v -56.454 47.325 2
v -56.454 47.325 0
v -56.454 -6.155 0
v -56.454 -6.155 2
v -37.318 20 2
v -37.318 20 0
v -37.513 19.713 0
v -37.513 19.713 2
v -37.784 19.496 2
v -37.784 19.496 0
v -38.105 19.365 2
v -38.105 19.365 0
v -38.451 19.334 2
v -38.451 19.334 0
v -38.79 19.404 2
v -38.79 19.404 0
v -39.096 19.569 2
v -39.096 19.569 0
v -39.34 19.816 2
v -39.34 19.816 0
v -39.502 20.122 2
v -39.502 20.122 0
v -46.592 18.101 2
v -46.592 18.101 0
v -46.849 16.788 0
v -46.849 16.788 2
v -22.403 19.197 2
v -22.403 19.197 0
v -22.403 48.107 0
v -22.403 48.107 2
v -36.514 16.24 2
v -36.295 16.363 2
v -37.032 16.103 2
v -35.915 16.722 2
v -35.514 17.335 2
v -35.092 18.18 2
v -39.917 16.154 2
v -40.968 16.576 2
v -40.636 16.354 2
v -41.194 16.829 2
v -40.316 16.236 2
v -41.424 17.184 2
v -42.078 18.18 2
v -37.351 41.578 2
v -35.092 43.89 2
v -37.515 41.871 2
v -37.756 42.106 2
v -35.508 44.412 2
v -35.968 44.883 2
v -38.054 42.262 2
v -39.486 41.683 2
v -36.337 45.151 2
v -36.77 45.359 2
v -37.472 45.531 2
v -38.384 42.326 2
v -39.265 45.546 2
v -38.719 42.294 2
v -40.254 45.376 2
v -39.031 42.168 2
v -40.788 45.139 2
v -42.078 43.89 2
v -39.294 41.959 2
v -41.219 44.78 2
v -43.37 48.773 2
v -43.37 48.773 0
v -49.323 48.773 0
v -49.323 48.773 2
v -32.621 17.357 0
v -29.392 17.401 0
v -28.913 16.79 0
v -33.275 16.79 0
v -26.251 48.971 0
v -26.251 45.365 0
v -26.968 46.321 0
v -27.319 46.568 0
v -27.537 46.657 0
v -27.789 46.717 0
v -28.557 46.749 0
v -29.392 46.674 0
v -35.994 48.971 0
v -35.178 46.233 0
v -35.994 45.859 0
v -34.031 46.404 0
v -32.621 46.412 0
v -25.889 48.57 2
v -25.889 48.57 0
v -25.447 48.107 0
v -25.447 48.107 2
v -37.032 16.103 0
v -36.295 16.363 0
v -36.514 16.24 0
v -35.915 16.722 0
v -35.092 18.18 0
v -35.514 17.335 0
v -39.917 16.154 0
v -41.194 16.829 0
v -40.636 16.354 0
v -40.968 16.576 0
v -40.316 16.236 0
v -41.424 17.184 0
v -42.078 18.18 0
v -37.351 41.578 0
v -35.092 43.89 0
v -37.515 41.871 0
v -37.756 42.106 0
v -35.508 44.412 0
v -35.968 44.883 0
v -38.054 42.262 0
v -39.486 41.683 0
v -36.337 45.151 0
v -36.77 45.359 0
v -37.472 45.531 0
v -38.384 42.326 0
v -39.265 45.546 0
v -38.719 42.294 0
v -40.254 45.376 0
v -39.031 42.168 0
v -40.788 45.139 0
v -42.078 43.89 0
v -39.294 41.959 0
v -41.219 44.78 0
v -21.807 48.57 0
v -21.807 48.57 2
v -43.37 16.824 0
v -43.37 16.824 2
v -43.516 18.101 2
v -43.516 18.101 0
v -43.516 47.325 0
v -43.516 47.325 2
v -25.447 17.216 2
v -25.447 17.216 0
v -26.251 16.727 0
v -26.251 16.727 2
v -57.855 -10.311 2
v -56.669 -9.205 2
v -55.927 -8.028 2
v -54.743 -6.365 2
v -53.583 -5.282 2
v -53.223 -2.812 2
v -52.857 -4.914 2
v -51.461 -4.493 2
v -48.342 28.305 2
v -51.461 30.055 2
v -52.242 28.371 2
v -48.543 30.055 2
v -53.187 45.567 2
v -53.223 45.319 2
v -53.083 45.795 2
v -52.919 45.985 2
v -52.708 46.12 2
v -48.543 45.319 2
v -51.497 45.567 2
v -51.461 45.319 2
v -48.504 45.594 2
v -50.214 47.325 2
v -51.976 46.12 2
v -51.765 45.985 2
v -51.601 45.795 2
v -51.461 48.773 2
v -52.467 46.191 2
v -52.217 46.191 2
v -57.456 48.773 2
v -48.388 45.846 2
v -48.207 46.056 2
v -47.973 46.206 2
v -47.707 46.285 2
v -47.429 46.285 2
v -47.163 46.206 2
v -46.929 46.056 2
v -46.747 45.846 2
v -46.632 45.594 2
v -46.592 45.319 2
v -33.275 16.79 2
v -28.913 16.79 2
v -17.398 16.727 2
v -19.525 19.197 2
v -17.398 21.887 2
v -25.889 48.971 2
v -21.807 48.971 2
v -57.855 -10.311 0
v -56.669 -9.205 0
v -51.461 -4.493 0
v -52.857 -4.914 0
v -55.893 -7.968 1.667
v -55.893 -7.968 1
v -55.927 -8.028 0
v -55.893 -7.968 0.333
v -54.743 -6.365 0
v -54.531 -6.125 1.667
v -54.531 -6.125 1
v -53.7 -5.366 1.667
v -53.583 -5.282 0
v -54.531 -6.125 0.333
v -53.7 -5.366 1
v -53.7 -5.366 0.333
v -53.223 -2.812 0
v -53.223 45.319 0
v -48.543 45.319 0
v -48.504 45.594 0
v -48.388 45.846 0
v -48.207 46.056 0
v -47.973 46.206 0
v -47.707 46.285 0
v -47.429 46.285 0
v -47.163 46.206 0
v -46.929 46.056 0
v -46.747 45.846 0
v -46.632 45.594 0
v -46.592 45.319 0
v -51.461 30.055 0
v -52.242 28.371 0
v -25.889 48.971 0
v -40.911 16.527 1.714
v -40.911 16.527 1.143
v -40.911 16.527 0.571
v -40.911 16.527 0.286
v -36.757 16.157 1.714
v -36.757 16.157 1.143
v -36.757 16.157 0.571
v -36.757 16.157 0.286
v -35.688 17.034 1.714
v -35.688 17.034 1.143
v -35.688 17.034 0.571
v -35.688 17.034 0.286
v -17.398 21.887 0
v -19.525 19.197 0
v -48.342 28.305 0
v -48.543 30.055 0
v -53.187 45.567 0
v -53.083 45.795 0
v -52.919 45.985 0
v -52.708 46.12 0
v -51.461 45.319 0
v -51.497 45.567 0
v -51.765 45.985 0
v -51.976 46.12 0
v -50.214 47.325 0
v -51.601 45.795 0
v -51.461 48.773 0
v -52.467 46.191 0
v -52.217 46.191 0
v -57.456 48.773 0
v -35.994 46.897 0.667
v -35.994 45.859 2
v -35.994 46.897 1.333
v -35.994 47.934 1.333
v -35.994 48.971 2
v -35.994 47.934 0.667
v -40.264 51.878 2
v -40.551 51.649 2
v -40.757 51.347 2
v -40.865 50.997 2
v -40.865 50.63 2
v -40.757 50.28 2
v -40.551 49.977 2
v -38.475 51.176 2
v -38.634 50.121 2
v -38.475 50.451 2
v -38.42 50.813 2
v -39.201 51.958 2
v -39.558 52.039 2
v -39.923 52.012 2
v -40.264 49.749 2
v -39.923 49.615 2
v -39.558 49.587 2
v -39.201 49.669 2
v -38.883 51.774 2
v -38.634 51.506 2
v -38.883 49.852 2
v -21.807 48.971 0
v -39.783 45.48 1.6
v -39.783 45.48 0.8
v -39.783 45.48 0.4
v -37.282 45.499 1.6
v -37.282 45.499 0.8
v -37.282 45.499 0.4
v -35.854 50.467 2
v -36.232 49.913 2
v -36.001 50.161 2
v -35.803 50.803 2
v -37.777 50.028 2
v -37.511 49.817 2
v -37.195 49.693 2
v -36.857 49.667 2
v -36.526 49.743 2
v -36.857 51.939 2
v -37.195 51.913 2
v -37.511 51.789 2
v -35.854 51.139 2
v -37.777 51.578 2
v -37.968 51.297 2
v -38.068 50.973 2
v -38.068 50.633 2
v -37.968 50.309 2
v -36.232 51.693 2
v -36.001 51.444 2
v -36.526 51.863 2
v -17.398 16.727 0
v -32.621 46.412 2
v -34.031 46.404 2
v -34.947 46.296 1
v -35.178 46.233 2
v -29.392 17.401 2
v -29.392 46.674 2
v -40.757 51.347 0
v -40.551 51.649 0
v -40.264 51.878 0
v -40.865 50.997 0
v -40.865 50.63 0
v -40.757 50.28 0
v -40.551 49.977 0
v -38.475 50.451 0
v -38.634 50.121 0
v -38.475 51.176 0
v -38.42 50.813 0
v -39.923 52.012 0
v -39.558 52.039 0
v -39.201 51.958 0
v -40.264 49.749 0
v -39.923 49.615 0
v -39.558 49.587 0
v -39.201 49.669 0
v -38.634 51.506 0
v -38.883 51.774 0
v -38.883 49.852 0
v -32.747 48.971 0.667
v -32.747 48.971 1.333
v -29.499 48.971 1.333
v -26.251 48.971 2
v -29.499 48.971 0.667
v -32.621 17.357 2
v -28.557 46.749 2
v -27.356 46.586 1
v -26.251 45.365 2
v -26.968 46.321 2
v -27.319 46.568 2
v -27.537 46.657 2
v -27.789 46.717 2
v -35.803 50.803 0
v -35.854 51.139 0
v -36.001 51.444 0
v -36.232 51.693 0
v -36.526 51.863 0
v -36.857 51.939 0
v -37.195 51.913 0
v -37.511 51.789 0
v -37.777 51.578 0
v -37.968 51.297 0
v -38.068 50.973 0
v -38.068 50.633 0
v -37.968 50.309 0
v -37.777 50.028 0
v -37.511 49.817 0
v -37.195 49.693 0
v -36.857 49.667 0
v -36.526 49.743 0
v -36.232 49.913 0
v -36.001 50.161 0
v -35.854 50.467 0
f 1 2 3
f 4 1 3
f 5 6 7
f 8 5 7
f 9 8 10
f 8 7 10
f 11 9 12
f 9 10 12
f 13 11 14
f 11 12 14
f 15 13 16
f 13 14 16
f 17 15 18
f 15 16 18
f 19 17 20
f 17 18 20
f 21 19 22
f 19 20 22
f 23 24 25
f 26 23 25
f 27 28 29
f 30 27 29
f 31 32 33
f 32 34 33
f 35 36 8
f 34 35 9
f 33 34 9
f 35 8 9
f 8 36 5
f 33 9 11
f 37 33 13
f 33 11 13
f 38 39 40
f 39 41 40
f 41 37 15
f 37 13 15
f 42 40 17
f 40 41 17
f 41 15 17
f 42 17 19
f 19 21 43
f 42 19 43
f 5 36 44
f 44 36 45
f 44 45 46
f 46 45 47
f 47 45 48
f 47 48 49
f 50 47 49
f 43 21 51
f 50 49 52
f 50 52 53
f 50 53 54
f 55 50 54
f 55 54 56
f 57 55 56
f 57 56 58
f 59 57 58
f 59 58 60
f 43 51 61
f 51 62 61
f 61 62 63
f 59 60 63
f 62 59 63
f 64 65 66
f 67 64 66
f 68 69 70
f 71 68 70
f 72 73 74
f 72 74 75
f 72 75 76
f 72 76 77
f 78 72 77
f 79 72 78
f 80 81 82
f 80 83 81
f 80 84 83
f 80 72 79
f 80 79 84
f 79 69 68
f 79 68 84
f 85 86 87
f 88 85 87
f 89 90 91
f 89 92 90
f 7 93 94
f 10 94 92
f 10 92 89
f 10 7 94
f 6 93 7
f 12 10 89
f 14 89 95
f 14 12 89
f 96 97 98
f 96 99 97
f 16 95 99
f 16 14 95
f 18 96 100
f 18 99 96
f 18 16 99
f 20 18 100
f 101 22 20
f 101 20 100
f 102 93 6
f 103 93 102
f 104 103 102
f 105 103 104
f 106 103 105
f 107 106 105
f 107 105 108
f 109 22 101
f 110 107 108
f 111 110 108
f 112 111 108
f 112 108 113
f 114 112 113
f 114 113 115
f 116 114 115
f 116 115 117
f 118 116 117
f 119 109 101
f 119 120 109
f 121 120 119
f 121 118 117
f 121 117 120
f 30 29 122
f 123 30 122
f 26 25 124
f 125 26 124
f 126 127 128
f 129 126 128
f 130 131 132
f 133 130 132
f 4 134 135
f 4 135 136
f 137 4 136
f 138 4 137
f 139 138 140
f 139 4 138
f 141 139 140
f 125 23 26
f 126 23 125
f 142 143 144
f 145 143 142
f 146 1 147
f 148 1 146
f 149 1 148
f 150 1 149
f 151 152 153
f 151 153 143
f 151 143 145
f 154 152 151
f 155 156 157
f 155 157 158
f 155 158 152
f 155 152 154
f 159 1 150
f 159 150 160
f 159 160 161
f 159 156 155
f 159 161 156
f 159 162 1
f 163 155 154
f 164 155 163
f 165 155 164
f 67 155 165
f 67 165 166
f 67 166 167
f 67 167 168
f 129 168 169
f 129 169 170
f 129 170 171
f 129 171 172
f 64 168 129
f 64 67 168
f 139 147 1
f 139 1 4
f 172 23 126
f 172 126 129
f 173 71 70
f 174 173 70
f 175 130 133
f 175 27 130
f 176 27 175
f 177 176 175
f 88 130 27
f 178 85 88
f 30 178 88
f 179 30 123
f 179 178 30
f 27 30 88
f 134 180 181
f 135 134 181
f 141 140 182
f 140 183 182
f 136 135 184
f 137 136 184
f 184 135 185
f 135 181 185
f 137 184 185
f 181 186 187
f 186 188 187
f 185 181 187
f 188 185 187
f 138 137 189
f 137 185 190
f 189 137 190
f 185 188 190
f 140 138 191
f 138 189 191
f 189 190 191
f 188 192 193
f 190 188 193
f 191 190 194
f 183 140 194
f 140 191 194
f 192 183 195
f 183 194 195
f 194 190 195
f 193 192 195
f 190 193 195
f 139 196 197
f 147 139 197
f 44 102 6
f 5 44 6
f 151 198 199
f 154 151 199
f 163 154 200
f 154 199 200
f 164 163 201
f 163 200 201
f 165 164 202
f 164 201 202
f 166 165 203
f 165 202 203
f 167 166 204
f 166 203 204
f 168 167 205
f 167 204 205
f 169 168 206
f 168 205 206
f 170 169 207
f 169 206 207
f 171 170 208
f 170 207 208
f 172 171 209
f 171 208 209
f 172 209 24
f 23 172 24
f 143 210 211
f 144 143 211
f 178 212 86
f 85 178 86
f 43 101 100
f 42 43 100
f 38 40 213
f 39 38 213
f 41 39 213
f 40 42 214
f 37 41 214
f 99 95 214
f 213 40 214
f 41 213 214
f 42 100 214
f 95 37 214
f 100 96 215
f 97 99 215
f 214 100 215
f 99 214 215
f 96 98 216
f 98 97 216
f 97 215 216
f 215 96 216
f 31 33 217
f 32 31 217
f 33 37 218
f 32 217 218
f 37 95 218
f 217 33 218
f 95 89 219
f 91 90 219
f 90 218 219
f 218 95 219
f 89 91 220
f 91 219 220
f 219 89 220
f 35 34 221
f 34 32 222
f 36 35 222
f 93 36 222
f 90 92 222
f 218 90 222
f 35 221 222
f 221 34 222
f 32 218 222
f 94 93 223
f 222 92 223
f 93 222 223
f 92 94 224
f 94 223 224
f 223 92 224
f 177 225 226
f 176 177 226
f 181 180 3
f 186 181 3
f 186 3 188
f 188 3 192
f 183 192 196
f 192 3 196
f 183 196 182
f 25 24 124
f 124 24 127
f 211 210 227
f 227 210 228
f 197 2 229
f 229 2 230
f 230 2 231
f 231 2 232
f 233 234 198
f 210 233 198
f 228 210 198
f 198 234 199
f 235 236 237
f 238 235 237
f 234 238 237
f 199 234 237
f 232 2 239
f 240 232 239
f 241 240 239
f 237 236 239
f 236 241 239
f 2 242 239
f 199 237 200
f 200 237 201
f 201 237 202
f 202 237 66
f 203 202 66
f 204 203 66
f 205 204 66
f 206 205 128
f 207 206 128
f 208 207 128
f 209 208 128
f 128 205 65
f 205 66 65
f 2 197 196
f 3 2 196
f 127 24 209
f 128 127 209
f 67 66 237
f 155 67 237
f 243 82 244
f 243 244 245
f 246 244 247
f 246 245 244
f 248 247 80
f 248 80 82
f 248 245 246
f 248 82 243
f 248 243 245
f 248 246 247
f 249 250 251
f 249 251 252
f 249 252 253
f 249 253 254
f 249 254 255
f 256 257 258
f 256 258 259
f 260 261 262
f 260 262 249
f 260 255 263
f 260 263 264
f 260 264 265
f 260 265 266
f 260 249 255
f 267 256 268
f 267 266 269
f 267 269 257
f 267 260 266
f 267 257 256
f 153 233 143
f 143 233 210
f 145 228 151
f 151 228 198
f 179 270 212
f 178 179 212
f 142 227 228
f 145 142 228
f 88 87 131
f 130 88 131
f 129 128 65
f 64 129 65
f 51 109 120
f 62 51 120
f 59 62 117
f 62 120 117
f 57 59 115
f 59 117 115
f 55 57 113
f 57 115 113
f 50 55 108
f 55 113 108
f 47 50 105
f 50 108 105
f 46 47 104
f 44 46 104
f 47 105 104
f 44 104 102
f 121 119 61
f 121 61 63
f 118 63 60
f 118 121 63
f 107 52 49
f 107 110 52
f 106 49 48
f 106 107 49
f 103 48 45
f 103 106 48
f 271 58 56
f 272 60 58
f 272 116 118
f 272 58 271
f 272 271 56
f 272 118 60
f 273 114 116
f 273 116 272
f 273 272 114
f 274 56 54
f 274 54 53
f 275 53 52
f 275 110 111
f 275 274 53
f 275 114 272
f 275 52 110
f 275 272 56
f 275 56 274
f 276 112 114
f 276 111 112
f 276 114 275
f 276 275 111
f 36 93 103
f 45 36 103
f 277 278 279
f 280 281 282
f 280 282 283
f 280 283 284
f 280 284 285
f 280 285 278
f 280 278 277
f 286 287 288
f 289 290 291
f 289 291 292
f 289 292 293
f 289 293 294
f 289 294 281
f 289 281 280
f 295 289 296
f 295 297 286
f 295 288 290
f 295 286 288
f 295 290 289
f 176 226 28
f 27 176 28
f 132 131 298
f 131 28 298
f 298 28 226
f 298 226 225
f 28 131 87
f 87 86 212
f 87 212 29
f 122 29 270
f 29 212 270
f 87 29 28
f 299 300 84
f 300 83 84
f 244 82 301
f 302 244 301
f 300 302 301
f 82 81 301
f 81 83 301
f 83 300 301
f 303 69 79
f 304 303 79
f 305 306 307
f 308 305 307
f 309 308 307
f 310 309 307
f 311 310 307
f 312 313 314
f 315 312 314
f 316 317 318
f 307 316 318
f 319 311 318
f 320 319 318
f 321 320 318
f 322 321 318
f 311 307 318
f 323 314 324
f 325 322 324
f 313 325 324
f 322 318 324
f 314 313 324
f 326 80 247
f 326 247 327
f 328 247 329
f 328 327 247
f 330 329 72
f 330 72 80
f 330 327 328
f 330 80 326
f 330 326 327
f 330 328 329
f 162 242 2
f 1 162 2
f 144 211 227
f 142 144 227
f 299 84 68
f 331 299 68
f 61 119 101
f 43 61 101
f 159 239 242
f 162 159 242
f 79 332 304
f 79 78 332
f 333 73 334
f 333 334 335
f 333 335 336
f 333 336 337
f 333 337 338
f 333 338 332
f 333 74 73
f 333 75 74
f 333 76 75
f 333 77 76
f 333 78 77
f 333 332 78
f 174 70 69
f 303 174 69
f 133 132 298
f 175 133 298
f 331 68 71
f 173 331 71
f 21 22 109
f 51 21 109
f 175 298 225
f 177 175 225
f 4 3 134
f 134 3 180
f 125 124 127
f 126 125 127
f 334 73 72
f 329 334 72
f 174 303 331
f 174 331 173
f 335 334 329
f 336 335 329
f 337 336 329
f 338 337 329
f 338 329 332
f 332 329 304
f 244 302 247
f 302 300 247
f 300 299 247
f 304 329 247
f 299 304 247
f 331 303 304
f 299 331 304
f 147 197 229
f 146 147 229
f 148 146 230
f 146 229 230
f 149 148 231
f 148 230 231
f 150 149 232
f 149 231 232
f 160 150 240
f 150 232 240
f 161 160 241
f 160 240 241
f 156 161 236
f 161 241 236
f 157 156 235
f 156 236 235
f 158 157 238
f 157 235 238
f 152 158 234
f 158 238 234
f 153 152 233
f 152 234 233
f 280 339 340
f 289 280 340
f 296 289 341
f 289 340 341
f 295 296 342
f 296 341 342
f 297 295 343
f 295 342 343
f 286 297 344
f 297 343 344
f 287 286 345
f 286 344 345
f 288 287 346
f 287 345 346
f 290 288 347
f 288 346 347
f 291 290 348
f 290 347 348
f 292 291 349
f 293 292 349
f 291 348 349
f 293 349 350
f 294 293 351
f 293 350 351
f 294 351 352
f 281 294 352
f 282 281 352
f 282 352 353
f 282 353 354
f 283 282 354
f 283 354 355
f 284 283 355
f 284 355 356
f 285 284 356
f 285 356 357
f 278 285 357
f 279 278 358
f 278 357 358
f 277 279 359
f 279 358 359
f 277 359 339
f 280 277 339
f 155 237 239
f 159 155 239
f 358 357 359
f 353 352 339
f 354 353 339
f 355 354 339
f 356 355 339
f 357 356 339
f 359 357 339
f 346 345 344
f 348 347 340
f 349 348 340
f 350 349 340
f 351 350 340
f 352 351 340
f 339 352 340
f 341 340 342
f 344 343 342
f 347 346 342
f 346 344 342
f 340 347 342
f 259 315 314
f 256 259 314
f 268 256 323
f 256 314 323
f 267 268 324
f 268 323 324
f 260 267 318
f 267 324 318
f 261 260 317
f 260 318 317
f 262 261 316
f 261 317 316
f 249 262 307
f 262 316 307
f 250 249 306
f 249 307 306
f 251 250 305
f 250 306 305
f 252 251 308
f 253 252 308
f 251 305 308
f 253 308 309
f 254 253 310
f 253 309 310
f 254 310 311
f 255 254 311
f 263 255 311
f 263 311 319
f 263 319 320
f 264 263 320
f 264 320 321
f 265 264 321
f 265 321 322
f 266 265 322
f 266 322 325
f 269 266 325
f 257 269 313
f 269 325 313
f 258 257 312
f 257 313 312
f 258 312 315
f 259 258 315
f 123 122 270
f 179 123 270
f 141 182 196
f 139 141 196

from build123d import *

# Parameters (mm, degrees)
F1_DEPTH = 2
F0_R     = 1.2293027529
F0_R_2   = 1.1387722668


with BuildPart() as f1:
    # F0 (on Top) → F1 (new body)
    with BuildSketch(Plane.XY):
        with BuildLine():
            Line((-56.4536973834, -6.1546978541), (-57.8551329672, -10.3112254292))
            add(Edge.make_bspline(
                [(-57.8551329672, -10.3112254292), (-57.3990056054, -9.9414517987), (-56.4859601505, -9.1536799978), (-55.9236162382, -7.9625439336), (-55.3275550964, -7.0871377477), (-54.5572435837, -6.1064735999), (-53.5728500895, -5.1965475686), (-52.8687499464, -4.8594879918), (-51.4612309635, -4.492750857)],
                knots=[0, 0, 0, 0, 0.1851248852, 0.3424784316, 0.4841918055, 0.6386525718, 0.7854964076, 1, 1, 1, 1], degree=3))
            Line((-51.4612309635, -4.492750857), (-53.2226637006, -2.8122463264))
            Line((-53.2226637006, -2.8122463264), (-53.2226637006, 45.3190617263))
            ThreePointArc((-53.2226637006, 45.3190617263), (-52.341947332, 46.1997780949), (-51.4612309635, 45.3190617263))
            Line((-51.4612309635, 45.3190617263), (-51.4612309635, 30.0551969558))
            Line((-51.4612309635, 30.0551969558), (-52.242167294, 28.371186927))
            Line((-52.242167294, 28.371186927), (-48.3424975936, 28.3045752825))
            Line((-48.3424975936, 28.3045752825), (-48.5432296991, 30.0551969558))
            Line((-48.5432296991, 30.0551969558), (-48.5432296991, 45.3190617263))
            ThreePointArc((-48.5432296991, 45.3190617263), (-47.5677810609, 46.2945103645), (-46.5923324227, 45.3190617263))
            Line((-46.5923324227, 45.3190617263), (-46.5923324227, 18.1011855602))
            Line((-46.5923324227, 18.1011855602), (-46.84920609, 16.7881511152))
            Line((-46.84920609, 16.7881511152), (-43.3698035777, 16.8244559318))
            Line((-43.3698035777, 16.8244559318), (-43.5161976447, 18.1011855602))
            Line((-43.5161976447, 18.1011855602), (-43.5161976447, 47.3245307803))
            Line((-43.5161976447, 47.3245307803), (-43.3698035777, 48.7729273736))
            Line((-43.3698035777, 48.7729273736), (-49.3231341243, 48.7729273736))
            Line((-49.3231341243, 48.7729273736), (-50.2144545317, 47.3245307803))
            Line((-50.2144545317, 47.3245307803), (-51.4612309635, 48.7729273736))
            Line((-51.4612309635, 48.7729273736), (-57.456433773, 48.7729273736))
            Line((-57.456433773, 48.7729273736), (-56.4536973834, 47.3245307803))
            Line((-56.4536973834, 47.3245307803), (-56.4536973834, -6.1546978541))
        make_face()
    extrude(amount=F1_DEPTH)


with BuildPart() as f1b:
    # F0 (on Top) → F1, piece 2 (new body)
    with BuildSketch(Plane.XY):
        with BuildLine():
            add(Edge.make_bspline(
                [(-42.0775525272, 43.8902974129), (-41.6942788959, 44.2154963908), (-41.036405557, 45.1327555061), (-39.8109964401, 45.5680290153), (-37.2395787485, 45.6733438975), (-35.9250489528, 44.9708525517), (-35.3615108781, 44.240565625), (-35.0915975869, 43.8902974129)],
                knots=[0, 0, 0, 0, 0.1971875376, 0.3772673806, 0.6274257288, 0.8183607775, 1, 1, 1, 1], degree=3))
            Line((-42.0775525272, 43.8902974129), (-42.0775525272, 18.1802082807))
            add(Edge.make_bspline(
                [(-42.0775525272, 18.1802082807), (-41.9429261615, 18.0153509456), (-41.6240175614, 17.6248299533), (-41.0127698726, 16.2664561335), (-39.2658081646, 16.0518243935), (-36.7606634204, 15.992326804), (-36.0911249212, 16.5025921155), (-35.642160255, 17.0346677821), (-35.2946967023, 17.757625575), (-35.0915975869, 18.1802082807)],
                knots=[0, 0, 0, 0, 0.1090973313, 0.258434349, 0.429378141, 0.6341982103, 0.7471561555, 0.8522079201, 1, 1, 1, 1], degree=3))
            Line((-35.0915975869, 18.1802082807), (-35.0915975869, 43.8902974129))
        make_face()
        with BuildLine():
            ThreePointArc((-39.486374706, 41.6832044721), (-38.3841825965, 42.3262593723), (-37.3506359756, 41.5778420866))
            Line((-37.3506359756, 41.5778420866), (-37.3176857829, 19.9997238815))
            ThreePointArc((-37.3176857829, 19.9997238815), (-38.4506574535, 19.3340583356), (-39.5020097494, 20.1223436743))
            Line((-39.5020097494, 20.1223436743), (-39.486374706, 41.6832044721))
        make_face(mode=Mode.SUBTRACT)
    extrude(amount=F1_DEPTH)


with BuildPart() as f1c:
    # F0 (on Top) → F1, piece 3 (new body)
    with BuildSketch(Plane.XY):
        with Locations((-39.6497291513, 50.8133545518)):
            Circle(F0_R)
    extrude(amount=F1_DEPTH)


with BuildPart() as f1d:
    # F0 (on Top) → F1, piece 4 (new body)
    with BuildSketch(Plane.XY):
        with Locations((-36.9417816401, 50.8029596414)):
            Circle(F0_R_2)
    extrude(amount=F1_DEPTH)


with BuildPart() as f1e:
    # F0 (on Top) → F1, piece 5 (new body)
    with BuildSketch(Plane.XY):
        with BuildLine():
            add(Edge.make_bspline(
                [(-35.9943732619, 45.8593294024), (-35.9943732619, 46.8966551125), (-35.9943732619, 47.9339808226), (-35.9943732619, 48.9713065326)],
                knots=[0, 0, 0, 0, 3.1119771302, 3.1119771302, 3.1119771302, 3.1119771302], degree=3))
            add(Edge.make_bspline(
                [(-35.9943732619, 45.8593294024), (-35.6848569517, 46.0290729346), (-34.9317656783, 46.4420798379), (-33.4773216876, 46.4231020734), (-32.6206460595, 46.4119240642)],
                knots=[0, 0, 0, 0, 0.4109944188, 1, 1, 1, 1], degree=3))
            Line((-32.6206460595, 46.4119240642), (-32.6206460595, 17.3571370542))
            Line((-32.6206460595, 17.3571370542), (-33.2751534879, 16.7897772044))
            Line((-33.2751534879, 16.7897772044), (-28.9125721902, 16.7897772044))
            Line((-28.9125721902, 16.7897772044), (-29.3923355639, 17.4005385488))
            Line((-29.3923355639, 17.4005385488), (-29.3923355639, 46.6736778617))
            add(Edge.make_bspline(
                [(-26.251276955, 45.3649051487), (-26.5624442676, 45.8622749418), (-27.2196972414, 46.9128280121), (-28.642918623, 46.7561688922), (-29.3923355639, 46.6736778617)],
                knots=[0, 0, 0, 0, 0.4734361425, 1, 1, 1, 1], degree=3))
            Line((-26.251276955, 45.3649051487), (-26.251276955, 48.9713065326))
            add(Edge.make_bspline(
                [(-35.9943732619, 48.9713065326), (-32.746674493, 48.9713065326), (-29.498975724, 48.9713065326), (-26.251276955, 48.9713065326)],
                knots=[0, 0, 0, 0, 9.7430963069, 9.7430963069, 9.7430963069, 9.7430963069], degree=3))
        make_face()
    extrude(amount=F1_DEPTH)


with BuildPart() as f1f:
    # F0 (on Top) → F1, piece 6 (new body)
    with BuildSketch(Plane.XY):
        Polygon((-25.8890558034, 48.5697090626), (-25.4468992352, 48.1069870293), (-25.4468992352, 17.2156337649), (-26.251276955, 16.7265031487), (-17.3976588994, 16.7265031487), (-17.3976588994, 21.8868292868), (-19.5253770798, 19.1966127604), (-22.4032197148, 19.1966127604), (-22.4032197148, 48.1069870293), (-21.8068230897, 48.5697090626), (-21.8068230897, 48.9713065326), (-25.8890558034, 48.9713065326), align=None)
    extrude(amount=F1_DEPTH)


solid = Compound([f1.part, f1b.part, f1c.part, f1d.part, f1e.part, f1f.part])
